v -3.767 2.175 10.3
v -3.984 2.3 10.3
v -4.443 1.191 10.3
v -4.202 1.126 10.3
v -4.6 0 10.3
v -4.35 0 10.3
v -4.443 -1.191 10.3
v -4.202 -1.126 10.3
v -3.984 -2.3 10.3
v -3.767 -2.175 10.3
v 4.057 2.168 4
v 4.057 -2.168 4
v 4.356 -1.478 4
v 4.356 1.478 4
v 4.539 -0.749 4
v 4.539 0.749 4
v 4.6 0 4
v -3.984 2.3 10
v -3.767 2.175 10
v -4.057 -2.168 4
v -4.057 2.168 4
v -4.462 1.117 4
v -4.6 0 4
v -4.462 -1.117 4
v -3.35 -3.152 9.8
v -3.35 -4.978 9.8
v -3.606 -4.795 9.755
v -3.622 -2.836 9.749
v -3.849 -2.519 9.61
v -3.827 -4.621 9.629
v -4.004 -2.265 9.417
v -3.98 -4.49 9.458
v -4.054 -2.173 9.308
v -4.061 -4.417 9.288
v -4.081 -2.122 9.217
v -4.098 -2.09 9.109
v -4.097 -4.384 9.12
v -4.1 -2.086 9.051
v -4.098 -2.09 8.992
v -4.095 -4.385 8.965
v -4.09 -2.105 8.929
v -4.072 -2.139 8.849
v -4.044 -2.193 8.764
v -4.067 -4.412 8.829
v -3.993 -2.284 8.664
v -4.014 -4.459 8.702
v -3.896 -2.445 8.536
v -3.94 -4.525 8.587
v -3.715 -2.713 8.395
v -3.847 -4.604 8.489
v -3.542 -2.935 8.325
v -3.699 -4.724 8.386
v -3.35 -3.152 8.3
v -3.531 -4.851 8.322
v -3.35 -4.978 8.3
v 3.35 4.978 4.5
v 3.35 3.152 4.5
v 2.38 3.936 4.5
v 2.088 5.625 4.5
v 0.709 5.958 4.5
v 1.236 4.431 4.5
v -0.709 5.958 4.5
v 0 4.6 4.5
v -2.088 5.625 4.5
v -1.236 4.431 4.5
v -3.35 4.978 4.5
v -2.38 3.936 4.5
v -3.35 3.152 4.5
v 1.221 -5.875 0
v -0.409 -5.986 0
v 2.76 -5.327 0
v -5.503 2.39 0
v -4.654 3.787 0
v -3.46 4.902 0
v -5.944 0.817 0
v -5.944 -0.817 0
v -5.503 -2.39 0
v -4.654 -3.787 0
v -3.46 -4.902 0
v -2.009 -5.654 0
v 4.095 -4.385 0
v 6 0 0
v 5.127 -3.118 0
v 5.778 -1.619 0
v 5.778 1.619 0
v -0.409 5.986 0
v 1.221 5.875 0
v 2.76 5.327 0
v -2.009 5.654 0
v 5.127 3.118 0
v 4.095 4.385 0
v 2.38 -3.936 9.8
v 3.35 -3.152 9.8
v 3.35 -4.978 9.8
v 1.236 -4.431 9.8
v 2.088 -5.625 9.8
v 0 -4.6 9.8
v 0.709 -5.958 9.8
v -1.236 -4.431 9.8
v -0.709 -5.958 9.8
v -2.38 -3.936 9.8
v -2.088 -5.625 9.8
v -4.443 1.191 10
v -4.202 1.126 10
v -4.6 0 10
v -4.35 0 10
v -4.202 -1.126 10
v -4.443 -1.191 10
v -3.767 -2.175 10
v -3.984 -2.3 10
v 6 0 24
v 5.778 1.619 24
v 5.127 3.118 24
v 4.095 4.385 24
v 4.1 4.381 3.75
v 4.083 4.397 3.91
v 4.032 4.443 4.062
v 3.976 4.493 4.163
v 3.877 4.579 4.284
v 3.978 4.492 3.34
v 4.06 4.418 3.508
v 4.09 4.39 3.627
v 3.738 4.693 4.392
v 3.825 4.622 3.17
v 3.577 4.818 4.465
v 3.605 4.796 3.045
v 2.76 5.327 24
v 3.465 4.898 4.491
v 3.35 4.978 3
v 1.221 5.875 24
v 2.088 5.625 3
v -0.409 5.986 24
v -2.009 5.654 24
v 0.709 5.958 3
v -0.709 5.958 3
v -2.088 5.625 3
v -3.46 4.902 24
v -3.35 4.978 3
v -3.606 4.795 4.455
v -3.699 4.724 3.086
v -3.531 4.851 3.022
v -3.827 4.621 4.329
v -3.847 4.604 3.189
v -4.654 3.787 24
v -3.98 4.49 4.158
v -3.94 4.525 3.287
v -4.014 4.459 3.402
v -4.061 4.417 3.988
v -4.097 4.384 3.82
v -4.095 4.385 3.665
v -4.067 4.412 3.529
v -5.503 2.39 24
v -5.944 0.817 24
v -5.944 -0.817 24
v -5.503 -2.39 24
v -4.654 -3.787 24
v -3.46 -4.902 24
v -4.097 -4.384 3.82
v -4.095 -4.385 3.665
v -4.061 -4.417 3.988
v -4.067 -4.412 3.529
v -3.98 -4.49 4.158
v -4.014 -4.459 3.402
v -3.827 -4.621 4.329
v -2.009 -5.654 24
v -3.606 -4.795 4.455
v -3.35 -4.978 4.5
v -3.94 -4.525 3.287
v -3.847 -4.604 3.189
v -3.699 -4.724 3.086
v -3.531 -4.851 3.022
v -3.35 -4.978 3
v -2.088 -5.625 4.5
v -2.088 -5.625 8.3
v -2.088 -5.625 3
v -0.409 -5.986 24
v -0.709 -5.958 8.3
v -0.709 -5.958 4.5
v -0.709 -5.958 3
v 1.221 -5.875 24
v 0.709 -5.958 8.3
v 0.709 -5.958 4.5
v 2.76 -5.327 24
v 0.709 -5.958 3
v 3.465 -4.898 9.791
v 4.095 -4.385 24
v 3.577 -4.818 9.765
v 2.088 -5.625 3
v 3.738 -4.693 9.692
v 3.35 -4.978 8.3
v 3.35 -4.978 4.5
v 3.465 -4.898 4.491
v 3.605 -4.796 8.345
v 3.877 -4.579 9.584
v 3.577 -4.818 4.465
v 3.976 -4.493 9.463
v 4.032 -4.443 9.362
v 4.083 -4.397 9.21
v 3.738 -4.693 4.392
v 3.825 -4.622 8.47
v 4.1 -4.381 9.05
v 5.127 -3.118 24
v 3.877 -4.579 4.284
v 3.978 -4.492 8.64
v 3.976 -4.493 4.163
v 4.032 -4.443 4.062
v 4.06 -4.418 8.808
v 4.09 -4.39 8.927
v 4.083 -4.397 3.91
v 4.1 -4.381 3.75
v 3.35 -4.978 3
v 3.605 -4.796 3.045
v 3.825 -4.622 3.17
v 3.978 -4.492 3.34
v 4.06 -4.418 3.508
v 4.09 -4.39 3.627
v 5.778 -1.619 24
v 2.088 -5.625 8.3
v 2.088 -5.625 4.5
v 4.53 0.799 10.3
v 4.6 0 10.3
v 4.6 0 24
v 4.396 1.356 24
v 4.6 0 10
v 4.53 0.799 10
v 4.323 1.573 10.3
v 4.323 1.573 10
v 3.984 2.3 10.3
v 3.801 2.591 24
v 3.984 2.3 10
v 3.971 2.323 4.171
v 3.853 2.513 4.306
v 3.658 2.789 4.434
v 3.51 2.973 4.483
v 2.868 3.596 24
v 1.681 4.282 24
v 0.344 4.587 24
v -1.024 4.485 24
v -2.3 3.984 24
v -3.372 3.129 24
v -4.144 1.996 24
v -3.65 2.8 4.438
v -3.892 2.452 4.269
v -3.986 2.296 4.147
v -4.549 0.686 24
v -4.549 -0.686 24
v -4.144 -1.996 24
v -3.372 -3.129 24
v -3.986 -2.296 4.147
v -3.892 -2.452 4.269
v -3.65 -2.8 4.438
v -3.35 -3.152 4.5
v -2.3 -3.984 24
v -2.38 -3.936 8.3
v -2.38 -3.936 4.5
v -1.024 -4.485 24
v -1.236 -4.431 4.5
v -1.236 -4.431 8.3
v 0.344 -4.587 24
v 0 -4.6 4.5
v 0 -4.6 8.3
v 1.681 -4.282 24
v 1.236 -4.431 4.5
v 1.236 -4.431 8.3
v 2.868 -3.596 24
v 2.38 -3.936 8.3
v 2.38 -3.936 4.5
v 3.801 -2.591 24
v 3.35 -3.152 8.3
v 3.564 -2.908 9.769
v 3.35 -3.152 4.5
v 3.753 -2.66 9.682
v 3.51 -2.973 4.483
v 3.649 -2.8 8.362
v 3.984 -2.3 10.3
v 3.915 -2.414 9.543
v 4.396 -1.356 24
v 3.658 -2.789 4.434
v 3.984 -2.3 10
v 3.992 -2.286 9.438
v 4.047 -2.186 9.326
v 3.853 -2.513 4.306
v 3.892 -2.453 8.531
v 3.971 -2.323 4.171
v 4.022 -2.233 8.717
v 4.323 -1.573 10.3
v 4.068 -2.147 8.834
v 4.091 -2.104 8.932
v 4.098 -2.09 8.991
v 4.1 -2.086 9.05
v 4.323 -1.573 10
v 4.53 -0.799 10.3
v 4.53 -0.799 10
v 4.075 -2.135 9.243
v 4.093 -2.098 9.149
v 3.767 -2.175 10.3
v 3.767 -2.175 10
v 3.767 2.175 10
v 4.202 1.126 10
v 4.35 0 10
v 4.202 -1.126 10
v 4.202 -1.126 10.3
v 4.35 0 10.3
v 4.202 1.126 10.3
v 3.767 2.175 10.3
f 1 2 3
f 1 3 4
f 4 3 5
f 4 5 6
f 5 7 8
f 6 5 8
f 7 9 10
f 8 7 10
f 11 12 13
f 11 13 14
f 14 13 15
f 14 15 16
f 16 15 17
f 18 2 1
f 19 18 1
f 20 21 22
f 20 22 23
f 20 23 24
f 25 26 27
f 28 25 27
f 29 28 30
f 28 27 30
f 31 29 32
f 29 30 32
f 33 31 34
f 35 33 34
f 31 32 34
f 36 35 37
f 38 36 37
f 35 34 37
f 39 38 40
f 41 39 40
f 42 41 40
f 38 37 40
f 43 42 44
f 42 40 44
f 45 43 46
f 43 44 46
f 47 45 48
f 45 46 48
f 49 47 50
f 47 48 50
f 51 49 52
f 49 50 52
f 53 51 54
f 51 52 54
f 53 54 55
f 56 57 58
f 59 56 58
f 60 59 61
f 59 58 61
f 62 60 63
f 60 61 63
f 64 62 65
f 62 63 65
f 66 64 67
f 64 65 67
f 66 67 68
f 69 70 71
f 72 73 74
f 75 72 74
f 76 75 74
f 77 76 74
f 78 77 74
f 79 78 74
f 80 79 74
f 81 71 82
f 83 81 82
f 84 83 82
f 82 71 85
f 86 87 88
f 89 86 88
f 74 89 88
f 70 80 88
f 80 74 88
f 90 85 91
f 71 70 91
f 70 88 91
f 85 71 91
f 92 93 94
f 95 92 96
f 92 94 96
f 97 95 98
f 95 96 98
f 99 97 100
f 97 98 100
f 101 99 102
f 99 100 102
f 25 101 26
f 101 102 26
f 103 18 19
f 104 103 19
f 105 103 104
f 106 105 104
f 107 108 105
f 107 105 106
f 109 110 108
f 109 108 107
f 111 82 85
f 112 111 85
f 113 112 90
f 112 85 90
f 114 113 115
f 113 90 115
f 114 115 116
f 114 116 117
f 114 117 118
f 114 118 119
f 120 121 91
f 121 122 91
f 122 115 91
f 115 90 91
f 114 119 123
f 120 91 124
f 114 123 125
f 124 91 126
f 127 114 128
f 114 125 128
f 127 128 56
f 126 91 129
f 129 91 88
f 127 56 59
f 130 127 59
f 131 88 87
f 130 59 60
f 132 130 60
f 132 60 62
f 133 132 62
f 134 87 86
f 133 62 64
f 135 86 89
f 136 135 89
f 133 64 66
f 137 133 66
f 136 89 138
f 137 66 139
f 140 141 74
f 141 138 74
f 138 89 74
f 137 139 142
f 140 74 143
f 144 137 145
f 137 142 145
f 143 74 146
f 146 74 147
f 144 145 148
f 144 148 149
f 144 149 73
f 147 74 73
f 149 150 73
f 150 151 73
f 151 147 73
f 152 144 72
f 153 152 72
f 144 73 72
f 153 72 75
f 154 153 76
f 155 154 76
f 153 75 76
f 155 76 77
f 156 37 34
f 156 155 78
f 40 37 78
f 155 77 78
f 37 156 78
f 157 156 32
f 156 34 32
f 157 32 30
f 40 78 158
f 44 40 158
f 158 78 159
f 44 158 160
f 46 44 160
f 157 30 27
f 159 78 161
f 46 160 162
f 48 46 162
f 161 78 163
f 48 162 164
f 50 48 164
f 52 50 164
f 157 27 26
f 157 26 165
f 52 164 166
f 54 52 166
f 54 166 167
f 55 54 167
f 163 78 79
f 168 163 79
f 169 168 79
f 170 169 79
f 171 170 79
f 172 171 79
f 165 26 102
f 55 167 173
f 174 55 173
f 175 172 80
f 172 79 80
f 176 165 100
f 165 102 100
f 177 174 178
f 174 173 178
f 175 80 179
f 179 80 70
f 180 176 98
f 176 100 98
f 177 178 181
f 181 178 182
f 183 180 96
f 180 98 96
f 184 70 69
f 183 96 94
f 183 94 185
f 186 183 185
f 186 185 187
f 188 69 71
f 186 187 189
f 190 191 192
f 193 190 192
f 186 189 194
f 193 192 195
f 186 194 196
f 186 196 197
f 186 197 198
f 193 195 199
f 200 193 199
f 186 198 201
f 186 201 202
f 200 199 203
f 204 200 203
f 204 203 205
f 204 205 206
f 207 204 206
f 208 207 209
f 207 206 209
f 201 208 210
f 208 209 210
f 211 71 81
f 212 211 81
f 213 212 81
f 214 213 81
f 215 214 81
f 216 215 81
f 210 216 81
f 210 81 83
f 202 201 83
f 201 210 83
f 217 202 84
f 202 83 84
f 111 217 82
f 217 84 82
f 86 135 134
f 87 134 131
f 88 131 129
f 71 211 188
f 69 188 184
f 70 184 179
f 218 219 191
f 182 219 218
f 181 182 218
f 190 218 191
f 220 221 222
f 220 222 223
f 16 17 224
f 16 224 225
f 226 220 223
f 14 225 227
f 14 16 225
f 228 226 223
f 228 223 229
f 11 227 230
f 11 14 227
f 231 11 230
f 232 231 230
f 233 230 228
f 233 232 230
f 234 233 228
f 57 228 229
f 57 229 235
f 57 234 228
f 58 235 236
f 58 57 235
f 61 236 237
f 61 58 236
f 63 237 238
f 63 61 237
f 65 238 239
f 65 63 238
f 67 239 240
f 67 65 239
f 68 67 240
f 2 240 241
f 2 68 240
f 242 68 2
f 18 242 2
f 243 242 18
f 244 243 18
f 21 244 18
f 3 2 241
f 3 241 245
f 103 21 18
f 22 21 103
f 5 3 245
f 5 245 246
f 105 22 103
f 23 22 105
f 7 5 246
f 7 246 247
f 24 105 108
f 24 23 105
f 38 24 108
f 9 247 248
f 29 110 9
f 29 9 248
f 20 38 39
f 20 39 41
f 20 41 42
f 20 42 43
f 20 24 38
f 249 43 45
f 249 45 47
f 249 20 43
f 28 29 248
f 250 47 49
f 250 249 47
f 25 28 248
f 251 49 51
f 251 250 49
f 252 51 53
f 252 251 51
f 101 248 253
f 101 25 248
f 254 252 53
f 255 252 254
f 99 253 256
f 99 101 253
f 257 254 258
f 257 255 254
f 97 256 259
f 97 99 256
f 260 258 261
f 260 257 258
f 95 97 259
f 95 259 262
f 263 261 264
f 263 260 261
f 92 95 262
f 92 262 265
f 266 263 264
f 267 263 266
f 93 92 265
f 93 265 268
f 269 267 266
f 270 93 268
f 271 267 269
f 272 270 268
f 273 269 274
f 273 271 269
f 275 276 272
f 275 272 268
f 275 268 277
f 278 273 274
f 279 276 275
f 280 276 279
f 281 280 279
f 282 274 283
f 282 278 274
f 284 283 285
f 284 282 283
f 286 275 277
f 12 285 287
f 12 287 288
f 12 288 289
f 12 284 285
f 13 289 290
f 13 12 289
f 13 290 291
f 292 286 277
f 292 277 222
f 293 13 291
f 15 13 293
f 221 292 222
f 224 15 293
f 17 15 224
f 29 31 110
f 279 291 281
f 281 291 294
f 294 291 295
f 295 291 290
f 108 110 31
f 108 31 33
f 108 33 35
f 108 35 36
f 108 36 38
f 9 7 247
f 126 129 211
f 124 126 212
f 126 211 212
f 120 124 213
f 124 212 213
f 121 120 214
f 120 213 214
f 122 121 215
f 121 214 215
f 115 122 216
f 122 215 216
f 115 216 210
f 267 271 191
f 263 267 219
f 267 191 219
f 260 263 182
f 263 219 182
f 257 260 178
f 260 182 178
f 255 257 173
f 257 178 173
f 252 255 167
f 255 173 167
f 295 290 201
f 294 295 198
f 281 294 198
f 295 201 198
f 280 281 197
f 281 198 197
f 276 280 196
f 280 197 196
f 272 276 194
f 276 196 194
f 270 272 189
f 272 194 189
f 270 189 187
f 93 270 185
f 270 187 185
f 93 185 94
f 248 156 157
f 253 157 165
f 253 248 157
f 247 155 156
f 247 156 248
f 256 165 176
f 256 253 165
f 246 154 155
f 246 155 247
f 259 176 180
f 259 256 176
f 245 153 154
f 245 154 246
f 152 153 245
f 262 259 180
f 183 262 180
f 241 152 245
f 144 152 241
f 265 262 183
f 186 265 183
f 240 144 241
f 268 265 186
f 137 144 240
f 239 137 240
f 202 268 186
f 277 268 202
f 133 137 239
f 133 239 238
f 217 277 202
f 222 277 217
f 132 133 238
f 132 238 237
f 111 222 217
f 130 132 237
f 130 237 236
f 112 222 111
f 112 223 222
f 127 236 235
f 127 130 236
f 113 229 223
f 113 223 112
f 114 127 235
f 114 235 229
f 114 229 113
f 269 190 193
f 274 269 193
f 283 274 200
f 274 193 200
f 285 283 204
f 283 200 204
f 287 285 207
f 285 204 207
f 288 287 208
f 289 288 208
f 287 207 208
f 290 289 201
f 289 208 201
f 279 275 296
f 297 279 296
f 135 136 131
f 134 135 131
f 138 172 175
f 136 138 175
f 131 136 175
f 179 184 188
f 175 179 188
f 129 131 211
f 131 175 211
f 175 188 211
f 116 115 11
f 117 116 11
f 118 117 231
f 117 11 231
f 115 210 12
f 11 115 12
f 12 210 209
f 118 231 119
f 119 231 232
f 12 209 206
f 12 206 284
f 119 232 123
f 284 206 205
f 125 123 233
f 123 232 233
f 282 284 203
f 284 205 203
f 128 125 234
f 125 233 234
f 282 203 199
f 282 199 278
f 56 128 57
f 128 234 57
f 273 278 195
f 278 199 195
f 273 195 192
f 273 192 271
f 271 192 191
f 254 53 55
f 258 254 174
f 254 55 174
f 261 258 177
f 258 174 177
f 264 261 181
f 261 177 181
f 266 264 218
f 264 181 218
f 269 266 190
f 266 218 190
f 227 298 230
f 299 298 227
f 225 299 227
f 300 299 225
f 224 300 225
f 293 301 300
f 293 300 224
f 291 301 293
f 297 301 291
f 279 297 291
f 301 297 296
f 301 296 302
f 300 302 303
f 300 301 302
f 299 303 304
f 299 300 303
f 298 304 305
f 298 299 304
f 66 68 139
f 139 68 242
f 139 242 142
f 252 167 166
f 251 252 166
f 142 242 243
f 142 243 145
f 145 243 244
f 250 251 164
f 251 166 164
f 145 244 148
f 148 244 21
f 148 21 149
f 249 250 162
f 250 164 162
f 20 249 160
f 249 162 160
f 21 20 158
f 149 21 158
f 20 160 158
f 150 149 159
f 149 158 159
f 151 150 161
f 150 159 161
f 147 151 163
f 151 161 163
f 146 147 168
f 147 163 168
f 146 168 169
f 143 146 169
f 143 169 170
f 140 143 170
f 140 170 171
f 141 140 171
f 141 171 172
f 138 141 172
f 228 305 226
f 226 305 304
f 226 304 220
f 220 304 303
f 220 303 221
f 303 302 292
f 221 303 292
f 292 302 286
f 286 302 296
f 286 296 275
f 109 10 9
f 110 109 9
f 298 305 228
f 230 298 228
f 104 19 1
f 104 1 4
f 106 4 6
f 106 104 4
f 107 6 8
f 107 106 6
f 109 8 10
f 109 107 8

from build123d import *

# Parameters (mm, degrees)
F0_R      = 6
F1_DEPTH  = 4
F2_R      = 6
F2_R_2    = 4.6
F3_DEPTH  = 20
F6_DEPTH  = 25
F9_DEPTH  = 0.3
F11_DEPTH = 10


with BuildPart() as f1:
    # F0 (on Top) → F1 (new body)
    with BuildSketch(Plane.XY):
        Circle(F0_R)
    extrude(amount=F1_DEPTH)

    # F2 (on face) → F3 (join)
    with BuildSketch(Plane.XY.offset(4)):
        Circle(F2_R)
        Circle(F2_R_2, mode=Mode.SUBTRACT)
    extrude(amount=F3_DEPTH)

    # F5 (on offset) → F6 (cut)
    with BuildSketch(Plane.XZ.offset(10)):
        with BuildLine():
            ThreePointArc((-2.6, 3.75), (-2.8196699141, 4.2803300859), (-3.35, 4.5))
            Line((-3.35, 4.5), (-3.35, 3))
            ThreePointArc((-3.35, 3), (-2.8196699141, 3.2196699141), (-2.6, 3.75))
        make_face()
        with BuildLine():
            Line((3.35, 4.5), (-3.35, 4.5))
            ThreePointArc((-3.35, 4.5), (-2.8196699141, 4.2803300859), (-2.6, 3.75))
            ThreePointArc((-2.6, 3.75), (-2.8196699141, 3.2196699141), (-3.35, 3))
            Line((-3.35, 3), (3.35, 3))
            ThreePointArc((3.35, 3), (2.6, 3.75), (3.35, 4.5))
        make_face()
        with BuildLine():
            Line((-3.35, 3), (-3.35, 4.5))
            ThreePointArc((-3.35, 4.5), (-4.1, 3.75), (-3.35, 3))
        make_face()
        with BuildLine():
            ThreePointArc((4.1, 3.75), (3.8803300859, 4.2803300859), (3.35, 4.5))
            Line((3.35, 4.5), (3.35, 3))
            ThreePointArc((3.35, 3), (3.8803300859, 3.2196699141), (4.1, 3.75))
        make_face()
        with BuildLine():
            Line((3.35, 3), (3.35, 4.5))
            ThreePointArc((3.35, 4.5), (2.6, 3.75), (3.35, 3))
        make_face()
    extrude(amount=-F6_DEPTH, mode=Mode.SUBTRACT)

    # F8 (on offset) → F9 (join)
    with BuildSketch(Plane(origin=(0, 0, 10), x_dir=(1, 0, 0), z_dir=(0, 0, -1))):
        with BuildLine():
            ThreePointArc((-3.7672105065, -2.175), (-4.35, 0), (-3.7672105065, 2.175))
            Line((-3.7672105065, 2.175), (-3.9837168574, 2.3))
            ThreePointArc((-3.9837168574, 2.3), (-4.6, 0), (-3.9837168574, -2.3))
            Line((-3.9837168574, -2.3), (-3.7672105065, -2.175))
        make_face()
        with BuildLine():
            Line((3.7672105065, -2.175), (3.9837168574, -2.3))
            ThreePointArc((3.9837168574, -2.3), (4.6, 0), (3.9837168574, 2.3))
            Line((3.9837168574, 2.3), (3.7672105065, 2.175))
            ThreePointArc((3.7672105065, 2.175), (4.35, 0), (3.7672105065, -2.175))
        make_face()
    extrude(amount=-F9_DEPTH)

    # F10 (on offset) → F11 (cut)
    with BuildSketch(Plane.XZ.offset(10)):
        with BuildLine():
            ThreePointArc((-2.6, 9.05), (-2.8196699141, 9.5803300859), (-3.35, 9.8))
            Line((-3.35, 9.8), (-3.35, 8.3))
            ThreePointArc((-3.35, 8.3), (-2.8196699141, 8.5196699141), (-2.6, 9.05))
        make_face()
        with BuildLine():
            Line((3.35, 9.8), (-3.35, 9.8))
            ThreePointArc((-3.35, 9.8), (-2.8196699141, 9.5803300859), (-2.6, 9.05))
            ThreePointArc((-2.6, 9.05), (-2.8196699141, 8.5196699141), (-3.35, 8.3))
            Line((-3.35, 8.3), (3.35, 8.3))
            ThreePointArc((3.35, 8.3), (2.6, 9.05), (3.35, 9.8))
        make_face()
        with BuildLine():
            Line((-3.35, 8.3), (-3.35, 9.8))
            ThreePointArc((-3.35, 9.8), (-4.1, 9.05), (-3.35, 8.3))
        make_face()
        with BuildLine():
            ThreePointArc((4.1, 9.05), (3.8803300859, 9.5803300859), (3.35, 9.8))
            Line((3.35, 9.8), (3.35, 8.3))
            ThreePointArc((3.35, 8.3), (3.8803300859, 8.5196699141), (4.1, 9.05))
        make_face()
        with BuildLine():
            Line((3.35, 8.3), (3.35, 9.8))
            ThreePointArc((3.35, 9.8), (2.6, 9.05), (3.35, 8.3))
        make_face()
    extrude(amount=-F11_DEPTH, mode=Mode.SUBTRACT)


solid = f1.part
